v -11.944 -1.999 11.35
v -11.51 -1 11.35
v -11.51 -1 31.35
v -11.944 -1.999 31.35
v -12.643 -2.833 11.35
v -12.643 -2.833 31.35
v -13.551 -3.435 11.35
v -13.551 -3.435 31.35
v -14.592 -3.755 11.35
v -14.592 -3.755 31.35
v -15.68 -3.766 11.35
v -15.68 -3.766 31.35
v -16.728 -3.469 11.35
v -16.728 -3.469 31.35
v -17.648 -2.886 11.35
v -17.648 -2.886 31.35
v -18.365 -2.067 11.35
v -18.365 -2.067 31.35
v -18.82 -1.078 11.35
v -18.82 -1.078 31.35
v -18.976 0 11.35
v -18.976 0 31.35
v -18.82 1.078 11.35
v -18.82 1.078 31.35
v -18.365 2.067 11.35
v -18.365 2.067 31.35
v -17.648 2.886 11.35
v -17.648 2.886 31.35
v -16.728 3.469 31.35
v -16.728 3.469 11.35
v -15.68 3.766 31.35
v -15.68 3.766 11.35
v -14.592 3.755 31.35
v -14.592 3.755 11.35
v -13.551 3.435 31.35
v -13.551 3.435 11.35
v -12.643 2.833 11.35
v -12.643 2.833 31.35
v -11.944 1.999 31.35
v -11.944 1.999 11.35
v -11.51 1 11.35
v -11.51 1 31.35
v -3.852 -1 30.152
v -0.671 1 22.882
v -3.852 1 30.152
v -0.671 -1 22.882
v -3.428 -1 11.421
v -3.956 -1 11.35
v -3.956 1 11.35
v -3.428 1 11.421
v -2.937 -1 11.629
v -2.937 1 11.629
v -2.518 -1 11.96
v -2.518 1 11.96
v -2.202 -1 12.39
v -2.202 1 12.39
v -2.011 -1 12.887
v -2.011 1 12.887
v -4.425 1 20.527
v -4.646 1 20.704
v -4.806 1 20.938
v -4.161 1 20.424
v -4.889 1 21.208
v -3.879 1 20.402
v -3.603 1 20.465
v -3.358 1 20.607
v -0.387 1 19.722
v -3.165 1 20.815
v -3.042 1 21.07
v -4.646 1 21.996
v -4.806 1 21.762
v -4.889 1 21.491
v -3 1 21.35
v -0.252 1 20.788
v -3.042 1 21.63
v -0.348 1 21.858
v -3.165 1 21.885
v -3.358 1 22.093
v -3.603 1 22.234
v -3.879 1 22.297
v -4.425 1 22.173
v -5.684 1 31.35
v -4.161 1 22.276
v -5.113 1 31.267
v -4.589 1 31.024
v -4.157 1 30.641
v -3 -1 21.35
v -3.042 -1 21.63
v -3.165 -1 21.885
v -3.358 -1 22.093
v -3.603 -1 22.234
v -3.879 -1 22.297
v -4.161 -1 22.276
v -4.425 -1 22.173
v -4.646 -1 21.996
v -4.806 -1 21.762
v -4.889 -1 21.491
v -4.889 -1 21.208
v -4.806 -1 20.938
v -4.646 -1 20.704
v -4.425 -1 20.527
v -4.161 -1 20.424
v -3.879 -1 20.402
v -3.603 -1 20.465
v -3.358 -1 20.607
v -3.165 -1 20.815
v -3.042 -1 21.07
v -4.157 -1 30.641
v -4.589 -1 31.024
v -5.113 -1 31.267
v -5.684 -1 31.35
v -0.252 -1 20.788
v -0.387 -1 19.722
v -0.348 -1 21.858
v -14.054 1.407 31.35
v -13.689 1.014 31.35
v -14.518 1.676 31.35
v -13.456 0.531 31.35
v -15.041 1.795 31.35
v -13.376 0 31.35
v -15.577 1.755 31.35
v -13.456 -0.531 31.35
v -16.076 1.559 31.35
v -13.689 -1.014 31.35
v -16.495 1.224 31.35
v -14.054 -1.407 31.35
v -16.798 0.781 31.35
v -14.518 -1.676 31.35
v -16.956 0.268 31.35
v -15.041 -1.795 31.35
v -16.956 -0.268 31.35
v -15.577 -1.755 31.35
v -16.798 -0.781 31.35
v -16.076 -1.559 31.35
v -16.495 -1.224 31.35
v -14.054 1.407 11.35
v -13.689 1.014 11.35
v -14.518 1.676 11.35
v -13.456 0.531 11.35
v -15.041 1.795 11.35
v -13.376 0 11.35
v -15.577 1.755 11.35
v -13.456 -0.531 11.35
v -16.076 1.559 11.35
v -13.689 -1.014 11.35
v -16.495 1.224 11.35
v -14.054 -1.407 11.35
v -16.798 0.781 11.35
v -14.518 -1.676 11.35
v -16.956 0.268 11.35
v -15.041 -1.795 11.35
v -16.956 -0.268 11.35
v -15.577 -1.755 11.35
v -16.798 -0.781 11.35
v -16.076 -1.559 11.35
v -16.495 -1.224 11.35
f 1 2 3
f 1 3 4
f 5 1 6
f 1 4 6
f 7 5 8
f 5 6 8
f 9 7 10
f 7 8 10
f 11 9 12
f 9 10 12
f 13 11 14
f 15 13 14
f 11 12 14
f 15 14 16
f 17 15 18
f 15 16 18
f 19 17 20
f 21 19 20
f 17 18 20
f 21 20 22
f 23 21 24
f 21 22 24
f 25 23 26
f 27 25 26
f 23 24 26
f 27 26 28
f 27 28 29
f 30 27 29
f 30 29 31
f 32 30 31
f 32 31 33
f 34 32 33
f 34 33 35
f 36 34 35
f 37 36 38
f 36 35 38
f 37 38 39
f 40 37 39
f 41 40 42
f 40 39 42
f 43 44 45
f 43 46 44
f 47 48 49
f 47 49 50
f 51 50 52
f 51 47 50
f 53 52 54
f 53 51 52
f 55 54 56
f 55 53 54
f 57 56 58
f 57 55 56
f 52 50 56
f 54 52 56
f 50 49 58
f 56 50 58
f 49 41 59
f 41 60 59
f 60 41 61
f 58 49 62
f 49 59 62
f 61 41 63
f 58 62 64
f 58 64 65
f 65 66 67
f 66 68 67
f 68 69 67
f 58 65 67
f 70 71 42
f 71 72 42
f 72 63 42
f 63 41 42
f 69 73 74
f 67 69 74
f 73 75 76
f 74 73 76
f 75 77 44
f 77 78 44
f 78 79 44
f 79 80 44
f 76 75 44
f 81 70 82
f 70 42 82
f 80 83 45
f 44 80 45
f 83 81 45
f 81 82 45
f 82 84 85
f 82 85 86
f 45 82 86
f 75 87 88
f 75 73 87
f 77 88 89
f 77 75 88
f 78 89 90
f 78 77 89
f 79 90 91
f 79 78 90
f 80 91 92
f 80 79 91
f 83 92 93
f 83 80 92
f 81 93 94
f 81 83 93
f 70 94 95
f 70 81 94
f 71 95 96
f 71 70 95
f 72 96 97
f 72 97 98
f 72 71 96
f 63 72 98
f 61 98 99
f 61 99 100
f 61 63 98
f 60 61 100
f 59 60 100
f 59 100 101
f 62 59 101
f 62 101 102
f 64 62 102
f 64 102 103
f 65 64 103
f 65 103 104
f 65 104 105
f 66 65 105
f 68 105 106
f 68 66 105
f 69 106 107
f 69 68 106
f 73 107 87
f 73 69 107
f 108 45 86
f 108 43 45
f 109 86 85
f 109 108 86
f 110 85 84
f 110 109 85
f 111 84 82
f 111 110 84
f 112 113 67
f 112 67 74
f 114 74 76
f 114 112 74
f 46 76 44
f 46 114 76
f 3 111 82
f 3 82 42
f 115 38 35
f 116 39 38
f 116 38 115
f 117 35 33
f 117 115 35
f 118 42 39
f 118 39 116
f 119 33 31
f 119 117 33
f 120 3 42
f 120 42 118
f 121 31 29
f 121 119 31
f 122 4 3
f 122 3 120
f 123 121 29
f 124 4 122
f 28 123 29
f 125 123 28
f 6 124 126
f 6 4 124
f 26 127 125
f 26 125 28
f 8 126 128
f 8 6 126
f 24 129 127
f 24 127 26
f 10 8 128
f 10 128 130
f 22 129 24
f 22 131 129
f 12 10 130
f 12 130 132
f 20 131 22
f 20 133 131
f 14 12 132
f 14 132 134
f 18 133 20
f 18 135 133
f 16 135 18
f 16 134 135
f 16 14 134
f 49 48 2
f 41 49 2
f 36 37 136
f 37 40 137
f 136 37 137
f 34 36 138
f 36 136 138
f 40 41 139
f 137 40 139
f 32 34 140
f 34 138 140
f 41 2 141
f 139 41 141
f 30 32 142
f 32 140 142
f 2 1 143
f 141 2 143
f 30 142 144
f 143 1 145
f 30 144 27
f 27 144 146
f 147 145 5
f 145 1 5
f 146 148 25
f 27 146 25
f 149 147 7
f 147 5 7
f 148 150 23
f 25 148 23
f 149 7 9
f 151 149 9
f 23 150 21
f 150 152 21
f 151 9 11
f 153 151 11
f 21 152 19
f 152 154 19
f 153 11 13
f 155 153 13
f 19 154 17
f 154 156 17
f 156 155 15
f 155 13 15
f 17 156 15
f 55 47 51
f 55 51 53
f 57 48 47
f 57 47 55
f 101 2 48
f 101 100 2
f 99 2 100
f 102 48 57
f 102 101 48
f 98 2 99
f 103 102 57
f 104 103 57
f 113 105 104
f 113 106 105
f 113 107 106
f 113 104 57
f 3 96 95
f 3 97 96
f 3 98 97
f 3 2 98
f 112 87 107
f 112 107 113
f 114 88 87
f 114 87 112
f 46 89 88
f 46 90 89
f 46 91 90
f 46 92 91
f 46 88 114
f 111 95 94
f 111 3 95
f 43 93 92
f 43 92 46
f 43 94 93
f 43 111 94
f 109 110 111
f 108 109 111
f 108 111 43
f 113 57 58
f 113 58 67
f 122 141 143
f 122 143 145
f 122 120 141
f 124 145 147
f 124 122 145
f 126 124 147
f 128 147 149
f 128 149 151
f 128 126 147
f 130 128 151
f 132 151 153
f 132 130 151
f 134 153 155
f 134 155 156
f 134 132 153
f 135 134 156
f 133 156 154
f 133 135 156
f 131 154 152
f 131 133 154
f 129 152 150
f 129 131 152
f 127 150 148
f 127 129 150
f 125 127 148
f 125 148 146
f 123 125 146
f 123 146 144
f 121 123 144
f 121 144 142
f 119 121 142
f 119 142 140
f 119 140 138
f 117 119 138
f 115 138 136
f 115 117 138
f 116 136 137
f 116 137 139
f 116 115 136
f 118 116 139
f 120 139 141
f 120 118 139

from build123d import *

# Parameters (mm, degrees)
F0_W     = 1.2968151346
F0_H     = 20
F0_W_2   = 0.7031848654
F0_R     = 0.95
F2_DEPTH = 1


with BuildPart() as f1:
    # F0 (on Front) → F1 (revolve)
    with BuildSketch(Plane.XZ):
        with Locations((-12.7275561206, 21.3498084247)):
            Rectangle(F0_W, F0_H)
        with Locations((-11.7275561206, 21.3498084247)):
            Rectangle(F0_W_2, F0_H)
    revolve(axis=Axis((-15.1759636879, 0, 21.4413572103), (0, 0, -1)))

    # F0 (on Front) → F2 (join, symmetric)
    with BuildSketch(Plane.XZ):
        with Locations((-11.7275561206, 21.3498084247)):
            Rectangle(F0_W_2, F0_H)
        with BuildLine():
            Line((-5.6838793599, 31.3498084247), (-11.3759636879, 31.3498084247))
            Line((-11.3759636879, 31.3498084247), (-11.3759636879, 11.3498084247))
            Line((-11.3759636879, 11.3498084247), (-3.9564480013, 11.3498084247))
            ThreePointArc((-3.9564480013, 11.3498084247), (-2.7164166971, 11.7806295424), (-2.0106170654, 12.8874860601))
            Line((-2.0106170654, 12.8874860601), (-0.386721159, 19.7221692442))
            ThreePointArc((-0.386721159, 19.7221692442), (-0.2713600171, 21.3254265154), (-0.6706739378, 22.8824398305))
            Line((-0.6706739378, 22.8824398305), (-3.8516295355, 30.1515942946))
            ThreePointArc((-3.8516295355, 30.1515942946), (-4.5892496827, 31.0236620234), (-5.6838793599, 31.3498084247))
        make_face()
        with Locations((-3.95, 21.3498084247)):
            Circle(F0_R, mode=Mode.SUBTRACT)
    extrude(amount=F2_DEPTH, both=True)


solid = f1.part
